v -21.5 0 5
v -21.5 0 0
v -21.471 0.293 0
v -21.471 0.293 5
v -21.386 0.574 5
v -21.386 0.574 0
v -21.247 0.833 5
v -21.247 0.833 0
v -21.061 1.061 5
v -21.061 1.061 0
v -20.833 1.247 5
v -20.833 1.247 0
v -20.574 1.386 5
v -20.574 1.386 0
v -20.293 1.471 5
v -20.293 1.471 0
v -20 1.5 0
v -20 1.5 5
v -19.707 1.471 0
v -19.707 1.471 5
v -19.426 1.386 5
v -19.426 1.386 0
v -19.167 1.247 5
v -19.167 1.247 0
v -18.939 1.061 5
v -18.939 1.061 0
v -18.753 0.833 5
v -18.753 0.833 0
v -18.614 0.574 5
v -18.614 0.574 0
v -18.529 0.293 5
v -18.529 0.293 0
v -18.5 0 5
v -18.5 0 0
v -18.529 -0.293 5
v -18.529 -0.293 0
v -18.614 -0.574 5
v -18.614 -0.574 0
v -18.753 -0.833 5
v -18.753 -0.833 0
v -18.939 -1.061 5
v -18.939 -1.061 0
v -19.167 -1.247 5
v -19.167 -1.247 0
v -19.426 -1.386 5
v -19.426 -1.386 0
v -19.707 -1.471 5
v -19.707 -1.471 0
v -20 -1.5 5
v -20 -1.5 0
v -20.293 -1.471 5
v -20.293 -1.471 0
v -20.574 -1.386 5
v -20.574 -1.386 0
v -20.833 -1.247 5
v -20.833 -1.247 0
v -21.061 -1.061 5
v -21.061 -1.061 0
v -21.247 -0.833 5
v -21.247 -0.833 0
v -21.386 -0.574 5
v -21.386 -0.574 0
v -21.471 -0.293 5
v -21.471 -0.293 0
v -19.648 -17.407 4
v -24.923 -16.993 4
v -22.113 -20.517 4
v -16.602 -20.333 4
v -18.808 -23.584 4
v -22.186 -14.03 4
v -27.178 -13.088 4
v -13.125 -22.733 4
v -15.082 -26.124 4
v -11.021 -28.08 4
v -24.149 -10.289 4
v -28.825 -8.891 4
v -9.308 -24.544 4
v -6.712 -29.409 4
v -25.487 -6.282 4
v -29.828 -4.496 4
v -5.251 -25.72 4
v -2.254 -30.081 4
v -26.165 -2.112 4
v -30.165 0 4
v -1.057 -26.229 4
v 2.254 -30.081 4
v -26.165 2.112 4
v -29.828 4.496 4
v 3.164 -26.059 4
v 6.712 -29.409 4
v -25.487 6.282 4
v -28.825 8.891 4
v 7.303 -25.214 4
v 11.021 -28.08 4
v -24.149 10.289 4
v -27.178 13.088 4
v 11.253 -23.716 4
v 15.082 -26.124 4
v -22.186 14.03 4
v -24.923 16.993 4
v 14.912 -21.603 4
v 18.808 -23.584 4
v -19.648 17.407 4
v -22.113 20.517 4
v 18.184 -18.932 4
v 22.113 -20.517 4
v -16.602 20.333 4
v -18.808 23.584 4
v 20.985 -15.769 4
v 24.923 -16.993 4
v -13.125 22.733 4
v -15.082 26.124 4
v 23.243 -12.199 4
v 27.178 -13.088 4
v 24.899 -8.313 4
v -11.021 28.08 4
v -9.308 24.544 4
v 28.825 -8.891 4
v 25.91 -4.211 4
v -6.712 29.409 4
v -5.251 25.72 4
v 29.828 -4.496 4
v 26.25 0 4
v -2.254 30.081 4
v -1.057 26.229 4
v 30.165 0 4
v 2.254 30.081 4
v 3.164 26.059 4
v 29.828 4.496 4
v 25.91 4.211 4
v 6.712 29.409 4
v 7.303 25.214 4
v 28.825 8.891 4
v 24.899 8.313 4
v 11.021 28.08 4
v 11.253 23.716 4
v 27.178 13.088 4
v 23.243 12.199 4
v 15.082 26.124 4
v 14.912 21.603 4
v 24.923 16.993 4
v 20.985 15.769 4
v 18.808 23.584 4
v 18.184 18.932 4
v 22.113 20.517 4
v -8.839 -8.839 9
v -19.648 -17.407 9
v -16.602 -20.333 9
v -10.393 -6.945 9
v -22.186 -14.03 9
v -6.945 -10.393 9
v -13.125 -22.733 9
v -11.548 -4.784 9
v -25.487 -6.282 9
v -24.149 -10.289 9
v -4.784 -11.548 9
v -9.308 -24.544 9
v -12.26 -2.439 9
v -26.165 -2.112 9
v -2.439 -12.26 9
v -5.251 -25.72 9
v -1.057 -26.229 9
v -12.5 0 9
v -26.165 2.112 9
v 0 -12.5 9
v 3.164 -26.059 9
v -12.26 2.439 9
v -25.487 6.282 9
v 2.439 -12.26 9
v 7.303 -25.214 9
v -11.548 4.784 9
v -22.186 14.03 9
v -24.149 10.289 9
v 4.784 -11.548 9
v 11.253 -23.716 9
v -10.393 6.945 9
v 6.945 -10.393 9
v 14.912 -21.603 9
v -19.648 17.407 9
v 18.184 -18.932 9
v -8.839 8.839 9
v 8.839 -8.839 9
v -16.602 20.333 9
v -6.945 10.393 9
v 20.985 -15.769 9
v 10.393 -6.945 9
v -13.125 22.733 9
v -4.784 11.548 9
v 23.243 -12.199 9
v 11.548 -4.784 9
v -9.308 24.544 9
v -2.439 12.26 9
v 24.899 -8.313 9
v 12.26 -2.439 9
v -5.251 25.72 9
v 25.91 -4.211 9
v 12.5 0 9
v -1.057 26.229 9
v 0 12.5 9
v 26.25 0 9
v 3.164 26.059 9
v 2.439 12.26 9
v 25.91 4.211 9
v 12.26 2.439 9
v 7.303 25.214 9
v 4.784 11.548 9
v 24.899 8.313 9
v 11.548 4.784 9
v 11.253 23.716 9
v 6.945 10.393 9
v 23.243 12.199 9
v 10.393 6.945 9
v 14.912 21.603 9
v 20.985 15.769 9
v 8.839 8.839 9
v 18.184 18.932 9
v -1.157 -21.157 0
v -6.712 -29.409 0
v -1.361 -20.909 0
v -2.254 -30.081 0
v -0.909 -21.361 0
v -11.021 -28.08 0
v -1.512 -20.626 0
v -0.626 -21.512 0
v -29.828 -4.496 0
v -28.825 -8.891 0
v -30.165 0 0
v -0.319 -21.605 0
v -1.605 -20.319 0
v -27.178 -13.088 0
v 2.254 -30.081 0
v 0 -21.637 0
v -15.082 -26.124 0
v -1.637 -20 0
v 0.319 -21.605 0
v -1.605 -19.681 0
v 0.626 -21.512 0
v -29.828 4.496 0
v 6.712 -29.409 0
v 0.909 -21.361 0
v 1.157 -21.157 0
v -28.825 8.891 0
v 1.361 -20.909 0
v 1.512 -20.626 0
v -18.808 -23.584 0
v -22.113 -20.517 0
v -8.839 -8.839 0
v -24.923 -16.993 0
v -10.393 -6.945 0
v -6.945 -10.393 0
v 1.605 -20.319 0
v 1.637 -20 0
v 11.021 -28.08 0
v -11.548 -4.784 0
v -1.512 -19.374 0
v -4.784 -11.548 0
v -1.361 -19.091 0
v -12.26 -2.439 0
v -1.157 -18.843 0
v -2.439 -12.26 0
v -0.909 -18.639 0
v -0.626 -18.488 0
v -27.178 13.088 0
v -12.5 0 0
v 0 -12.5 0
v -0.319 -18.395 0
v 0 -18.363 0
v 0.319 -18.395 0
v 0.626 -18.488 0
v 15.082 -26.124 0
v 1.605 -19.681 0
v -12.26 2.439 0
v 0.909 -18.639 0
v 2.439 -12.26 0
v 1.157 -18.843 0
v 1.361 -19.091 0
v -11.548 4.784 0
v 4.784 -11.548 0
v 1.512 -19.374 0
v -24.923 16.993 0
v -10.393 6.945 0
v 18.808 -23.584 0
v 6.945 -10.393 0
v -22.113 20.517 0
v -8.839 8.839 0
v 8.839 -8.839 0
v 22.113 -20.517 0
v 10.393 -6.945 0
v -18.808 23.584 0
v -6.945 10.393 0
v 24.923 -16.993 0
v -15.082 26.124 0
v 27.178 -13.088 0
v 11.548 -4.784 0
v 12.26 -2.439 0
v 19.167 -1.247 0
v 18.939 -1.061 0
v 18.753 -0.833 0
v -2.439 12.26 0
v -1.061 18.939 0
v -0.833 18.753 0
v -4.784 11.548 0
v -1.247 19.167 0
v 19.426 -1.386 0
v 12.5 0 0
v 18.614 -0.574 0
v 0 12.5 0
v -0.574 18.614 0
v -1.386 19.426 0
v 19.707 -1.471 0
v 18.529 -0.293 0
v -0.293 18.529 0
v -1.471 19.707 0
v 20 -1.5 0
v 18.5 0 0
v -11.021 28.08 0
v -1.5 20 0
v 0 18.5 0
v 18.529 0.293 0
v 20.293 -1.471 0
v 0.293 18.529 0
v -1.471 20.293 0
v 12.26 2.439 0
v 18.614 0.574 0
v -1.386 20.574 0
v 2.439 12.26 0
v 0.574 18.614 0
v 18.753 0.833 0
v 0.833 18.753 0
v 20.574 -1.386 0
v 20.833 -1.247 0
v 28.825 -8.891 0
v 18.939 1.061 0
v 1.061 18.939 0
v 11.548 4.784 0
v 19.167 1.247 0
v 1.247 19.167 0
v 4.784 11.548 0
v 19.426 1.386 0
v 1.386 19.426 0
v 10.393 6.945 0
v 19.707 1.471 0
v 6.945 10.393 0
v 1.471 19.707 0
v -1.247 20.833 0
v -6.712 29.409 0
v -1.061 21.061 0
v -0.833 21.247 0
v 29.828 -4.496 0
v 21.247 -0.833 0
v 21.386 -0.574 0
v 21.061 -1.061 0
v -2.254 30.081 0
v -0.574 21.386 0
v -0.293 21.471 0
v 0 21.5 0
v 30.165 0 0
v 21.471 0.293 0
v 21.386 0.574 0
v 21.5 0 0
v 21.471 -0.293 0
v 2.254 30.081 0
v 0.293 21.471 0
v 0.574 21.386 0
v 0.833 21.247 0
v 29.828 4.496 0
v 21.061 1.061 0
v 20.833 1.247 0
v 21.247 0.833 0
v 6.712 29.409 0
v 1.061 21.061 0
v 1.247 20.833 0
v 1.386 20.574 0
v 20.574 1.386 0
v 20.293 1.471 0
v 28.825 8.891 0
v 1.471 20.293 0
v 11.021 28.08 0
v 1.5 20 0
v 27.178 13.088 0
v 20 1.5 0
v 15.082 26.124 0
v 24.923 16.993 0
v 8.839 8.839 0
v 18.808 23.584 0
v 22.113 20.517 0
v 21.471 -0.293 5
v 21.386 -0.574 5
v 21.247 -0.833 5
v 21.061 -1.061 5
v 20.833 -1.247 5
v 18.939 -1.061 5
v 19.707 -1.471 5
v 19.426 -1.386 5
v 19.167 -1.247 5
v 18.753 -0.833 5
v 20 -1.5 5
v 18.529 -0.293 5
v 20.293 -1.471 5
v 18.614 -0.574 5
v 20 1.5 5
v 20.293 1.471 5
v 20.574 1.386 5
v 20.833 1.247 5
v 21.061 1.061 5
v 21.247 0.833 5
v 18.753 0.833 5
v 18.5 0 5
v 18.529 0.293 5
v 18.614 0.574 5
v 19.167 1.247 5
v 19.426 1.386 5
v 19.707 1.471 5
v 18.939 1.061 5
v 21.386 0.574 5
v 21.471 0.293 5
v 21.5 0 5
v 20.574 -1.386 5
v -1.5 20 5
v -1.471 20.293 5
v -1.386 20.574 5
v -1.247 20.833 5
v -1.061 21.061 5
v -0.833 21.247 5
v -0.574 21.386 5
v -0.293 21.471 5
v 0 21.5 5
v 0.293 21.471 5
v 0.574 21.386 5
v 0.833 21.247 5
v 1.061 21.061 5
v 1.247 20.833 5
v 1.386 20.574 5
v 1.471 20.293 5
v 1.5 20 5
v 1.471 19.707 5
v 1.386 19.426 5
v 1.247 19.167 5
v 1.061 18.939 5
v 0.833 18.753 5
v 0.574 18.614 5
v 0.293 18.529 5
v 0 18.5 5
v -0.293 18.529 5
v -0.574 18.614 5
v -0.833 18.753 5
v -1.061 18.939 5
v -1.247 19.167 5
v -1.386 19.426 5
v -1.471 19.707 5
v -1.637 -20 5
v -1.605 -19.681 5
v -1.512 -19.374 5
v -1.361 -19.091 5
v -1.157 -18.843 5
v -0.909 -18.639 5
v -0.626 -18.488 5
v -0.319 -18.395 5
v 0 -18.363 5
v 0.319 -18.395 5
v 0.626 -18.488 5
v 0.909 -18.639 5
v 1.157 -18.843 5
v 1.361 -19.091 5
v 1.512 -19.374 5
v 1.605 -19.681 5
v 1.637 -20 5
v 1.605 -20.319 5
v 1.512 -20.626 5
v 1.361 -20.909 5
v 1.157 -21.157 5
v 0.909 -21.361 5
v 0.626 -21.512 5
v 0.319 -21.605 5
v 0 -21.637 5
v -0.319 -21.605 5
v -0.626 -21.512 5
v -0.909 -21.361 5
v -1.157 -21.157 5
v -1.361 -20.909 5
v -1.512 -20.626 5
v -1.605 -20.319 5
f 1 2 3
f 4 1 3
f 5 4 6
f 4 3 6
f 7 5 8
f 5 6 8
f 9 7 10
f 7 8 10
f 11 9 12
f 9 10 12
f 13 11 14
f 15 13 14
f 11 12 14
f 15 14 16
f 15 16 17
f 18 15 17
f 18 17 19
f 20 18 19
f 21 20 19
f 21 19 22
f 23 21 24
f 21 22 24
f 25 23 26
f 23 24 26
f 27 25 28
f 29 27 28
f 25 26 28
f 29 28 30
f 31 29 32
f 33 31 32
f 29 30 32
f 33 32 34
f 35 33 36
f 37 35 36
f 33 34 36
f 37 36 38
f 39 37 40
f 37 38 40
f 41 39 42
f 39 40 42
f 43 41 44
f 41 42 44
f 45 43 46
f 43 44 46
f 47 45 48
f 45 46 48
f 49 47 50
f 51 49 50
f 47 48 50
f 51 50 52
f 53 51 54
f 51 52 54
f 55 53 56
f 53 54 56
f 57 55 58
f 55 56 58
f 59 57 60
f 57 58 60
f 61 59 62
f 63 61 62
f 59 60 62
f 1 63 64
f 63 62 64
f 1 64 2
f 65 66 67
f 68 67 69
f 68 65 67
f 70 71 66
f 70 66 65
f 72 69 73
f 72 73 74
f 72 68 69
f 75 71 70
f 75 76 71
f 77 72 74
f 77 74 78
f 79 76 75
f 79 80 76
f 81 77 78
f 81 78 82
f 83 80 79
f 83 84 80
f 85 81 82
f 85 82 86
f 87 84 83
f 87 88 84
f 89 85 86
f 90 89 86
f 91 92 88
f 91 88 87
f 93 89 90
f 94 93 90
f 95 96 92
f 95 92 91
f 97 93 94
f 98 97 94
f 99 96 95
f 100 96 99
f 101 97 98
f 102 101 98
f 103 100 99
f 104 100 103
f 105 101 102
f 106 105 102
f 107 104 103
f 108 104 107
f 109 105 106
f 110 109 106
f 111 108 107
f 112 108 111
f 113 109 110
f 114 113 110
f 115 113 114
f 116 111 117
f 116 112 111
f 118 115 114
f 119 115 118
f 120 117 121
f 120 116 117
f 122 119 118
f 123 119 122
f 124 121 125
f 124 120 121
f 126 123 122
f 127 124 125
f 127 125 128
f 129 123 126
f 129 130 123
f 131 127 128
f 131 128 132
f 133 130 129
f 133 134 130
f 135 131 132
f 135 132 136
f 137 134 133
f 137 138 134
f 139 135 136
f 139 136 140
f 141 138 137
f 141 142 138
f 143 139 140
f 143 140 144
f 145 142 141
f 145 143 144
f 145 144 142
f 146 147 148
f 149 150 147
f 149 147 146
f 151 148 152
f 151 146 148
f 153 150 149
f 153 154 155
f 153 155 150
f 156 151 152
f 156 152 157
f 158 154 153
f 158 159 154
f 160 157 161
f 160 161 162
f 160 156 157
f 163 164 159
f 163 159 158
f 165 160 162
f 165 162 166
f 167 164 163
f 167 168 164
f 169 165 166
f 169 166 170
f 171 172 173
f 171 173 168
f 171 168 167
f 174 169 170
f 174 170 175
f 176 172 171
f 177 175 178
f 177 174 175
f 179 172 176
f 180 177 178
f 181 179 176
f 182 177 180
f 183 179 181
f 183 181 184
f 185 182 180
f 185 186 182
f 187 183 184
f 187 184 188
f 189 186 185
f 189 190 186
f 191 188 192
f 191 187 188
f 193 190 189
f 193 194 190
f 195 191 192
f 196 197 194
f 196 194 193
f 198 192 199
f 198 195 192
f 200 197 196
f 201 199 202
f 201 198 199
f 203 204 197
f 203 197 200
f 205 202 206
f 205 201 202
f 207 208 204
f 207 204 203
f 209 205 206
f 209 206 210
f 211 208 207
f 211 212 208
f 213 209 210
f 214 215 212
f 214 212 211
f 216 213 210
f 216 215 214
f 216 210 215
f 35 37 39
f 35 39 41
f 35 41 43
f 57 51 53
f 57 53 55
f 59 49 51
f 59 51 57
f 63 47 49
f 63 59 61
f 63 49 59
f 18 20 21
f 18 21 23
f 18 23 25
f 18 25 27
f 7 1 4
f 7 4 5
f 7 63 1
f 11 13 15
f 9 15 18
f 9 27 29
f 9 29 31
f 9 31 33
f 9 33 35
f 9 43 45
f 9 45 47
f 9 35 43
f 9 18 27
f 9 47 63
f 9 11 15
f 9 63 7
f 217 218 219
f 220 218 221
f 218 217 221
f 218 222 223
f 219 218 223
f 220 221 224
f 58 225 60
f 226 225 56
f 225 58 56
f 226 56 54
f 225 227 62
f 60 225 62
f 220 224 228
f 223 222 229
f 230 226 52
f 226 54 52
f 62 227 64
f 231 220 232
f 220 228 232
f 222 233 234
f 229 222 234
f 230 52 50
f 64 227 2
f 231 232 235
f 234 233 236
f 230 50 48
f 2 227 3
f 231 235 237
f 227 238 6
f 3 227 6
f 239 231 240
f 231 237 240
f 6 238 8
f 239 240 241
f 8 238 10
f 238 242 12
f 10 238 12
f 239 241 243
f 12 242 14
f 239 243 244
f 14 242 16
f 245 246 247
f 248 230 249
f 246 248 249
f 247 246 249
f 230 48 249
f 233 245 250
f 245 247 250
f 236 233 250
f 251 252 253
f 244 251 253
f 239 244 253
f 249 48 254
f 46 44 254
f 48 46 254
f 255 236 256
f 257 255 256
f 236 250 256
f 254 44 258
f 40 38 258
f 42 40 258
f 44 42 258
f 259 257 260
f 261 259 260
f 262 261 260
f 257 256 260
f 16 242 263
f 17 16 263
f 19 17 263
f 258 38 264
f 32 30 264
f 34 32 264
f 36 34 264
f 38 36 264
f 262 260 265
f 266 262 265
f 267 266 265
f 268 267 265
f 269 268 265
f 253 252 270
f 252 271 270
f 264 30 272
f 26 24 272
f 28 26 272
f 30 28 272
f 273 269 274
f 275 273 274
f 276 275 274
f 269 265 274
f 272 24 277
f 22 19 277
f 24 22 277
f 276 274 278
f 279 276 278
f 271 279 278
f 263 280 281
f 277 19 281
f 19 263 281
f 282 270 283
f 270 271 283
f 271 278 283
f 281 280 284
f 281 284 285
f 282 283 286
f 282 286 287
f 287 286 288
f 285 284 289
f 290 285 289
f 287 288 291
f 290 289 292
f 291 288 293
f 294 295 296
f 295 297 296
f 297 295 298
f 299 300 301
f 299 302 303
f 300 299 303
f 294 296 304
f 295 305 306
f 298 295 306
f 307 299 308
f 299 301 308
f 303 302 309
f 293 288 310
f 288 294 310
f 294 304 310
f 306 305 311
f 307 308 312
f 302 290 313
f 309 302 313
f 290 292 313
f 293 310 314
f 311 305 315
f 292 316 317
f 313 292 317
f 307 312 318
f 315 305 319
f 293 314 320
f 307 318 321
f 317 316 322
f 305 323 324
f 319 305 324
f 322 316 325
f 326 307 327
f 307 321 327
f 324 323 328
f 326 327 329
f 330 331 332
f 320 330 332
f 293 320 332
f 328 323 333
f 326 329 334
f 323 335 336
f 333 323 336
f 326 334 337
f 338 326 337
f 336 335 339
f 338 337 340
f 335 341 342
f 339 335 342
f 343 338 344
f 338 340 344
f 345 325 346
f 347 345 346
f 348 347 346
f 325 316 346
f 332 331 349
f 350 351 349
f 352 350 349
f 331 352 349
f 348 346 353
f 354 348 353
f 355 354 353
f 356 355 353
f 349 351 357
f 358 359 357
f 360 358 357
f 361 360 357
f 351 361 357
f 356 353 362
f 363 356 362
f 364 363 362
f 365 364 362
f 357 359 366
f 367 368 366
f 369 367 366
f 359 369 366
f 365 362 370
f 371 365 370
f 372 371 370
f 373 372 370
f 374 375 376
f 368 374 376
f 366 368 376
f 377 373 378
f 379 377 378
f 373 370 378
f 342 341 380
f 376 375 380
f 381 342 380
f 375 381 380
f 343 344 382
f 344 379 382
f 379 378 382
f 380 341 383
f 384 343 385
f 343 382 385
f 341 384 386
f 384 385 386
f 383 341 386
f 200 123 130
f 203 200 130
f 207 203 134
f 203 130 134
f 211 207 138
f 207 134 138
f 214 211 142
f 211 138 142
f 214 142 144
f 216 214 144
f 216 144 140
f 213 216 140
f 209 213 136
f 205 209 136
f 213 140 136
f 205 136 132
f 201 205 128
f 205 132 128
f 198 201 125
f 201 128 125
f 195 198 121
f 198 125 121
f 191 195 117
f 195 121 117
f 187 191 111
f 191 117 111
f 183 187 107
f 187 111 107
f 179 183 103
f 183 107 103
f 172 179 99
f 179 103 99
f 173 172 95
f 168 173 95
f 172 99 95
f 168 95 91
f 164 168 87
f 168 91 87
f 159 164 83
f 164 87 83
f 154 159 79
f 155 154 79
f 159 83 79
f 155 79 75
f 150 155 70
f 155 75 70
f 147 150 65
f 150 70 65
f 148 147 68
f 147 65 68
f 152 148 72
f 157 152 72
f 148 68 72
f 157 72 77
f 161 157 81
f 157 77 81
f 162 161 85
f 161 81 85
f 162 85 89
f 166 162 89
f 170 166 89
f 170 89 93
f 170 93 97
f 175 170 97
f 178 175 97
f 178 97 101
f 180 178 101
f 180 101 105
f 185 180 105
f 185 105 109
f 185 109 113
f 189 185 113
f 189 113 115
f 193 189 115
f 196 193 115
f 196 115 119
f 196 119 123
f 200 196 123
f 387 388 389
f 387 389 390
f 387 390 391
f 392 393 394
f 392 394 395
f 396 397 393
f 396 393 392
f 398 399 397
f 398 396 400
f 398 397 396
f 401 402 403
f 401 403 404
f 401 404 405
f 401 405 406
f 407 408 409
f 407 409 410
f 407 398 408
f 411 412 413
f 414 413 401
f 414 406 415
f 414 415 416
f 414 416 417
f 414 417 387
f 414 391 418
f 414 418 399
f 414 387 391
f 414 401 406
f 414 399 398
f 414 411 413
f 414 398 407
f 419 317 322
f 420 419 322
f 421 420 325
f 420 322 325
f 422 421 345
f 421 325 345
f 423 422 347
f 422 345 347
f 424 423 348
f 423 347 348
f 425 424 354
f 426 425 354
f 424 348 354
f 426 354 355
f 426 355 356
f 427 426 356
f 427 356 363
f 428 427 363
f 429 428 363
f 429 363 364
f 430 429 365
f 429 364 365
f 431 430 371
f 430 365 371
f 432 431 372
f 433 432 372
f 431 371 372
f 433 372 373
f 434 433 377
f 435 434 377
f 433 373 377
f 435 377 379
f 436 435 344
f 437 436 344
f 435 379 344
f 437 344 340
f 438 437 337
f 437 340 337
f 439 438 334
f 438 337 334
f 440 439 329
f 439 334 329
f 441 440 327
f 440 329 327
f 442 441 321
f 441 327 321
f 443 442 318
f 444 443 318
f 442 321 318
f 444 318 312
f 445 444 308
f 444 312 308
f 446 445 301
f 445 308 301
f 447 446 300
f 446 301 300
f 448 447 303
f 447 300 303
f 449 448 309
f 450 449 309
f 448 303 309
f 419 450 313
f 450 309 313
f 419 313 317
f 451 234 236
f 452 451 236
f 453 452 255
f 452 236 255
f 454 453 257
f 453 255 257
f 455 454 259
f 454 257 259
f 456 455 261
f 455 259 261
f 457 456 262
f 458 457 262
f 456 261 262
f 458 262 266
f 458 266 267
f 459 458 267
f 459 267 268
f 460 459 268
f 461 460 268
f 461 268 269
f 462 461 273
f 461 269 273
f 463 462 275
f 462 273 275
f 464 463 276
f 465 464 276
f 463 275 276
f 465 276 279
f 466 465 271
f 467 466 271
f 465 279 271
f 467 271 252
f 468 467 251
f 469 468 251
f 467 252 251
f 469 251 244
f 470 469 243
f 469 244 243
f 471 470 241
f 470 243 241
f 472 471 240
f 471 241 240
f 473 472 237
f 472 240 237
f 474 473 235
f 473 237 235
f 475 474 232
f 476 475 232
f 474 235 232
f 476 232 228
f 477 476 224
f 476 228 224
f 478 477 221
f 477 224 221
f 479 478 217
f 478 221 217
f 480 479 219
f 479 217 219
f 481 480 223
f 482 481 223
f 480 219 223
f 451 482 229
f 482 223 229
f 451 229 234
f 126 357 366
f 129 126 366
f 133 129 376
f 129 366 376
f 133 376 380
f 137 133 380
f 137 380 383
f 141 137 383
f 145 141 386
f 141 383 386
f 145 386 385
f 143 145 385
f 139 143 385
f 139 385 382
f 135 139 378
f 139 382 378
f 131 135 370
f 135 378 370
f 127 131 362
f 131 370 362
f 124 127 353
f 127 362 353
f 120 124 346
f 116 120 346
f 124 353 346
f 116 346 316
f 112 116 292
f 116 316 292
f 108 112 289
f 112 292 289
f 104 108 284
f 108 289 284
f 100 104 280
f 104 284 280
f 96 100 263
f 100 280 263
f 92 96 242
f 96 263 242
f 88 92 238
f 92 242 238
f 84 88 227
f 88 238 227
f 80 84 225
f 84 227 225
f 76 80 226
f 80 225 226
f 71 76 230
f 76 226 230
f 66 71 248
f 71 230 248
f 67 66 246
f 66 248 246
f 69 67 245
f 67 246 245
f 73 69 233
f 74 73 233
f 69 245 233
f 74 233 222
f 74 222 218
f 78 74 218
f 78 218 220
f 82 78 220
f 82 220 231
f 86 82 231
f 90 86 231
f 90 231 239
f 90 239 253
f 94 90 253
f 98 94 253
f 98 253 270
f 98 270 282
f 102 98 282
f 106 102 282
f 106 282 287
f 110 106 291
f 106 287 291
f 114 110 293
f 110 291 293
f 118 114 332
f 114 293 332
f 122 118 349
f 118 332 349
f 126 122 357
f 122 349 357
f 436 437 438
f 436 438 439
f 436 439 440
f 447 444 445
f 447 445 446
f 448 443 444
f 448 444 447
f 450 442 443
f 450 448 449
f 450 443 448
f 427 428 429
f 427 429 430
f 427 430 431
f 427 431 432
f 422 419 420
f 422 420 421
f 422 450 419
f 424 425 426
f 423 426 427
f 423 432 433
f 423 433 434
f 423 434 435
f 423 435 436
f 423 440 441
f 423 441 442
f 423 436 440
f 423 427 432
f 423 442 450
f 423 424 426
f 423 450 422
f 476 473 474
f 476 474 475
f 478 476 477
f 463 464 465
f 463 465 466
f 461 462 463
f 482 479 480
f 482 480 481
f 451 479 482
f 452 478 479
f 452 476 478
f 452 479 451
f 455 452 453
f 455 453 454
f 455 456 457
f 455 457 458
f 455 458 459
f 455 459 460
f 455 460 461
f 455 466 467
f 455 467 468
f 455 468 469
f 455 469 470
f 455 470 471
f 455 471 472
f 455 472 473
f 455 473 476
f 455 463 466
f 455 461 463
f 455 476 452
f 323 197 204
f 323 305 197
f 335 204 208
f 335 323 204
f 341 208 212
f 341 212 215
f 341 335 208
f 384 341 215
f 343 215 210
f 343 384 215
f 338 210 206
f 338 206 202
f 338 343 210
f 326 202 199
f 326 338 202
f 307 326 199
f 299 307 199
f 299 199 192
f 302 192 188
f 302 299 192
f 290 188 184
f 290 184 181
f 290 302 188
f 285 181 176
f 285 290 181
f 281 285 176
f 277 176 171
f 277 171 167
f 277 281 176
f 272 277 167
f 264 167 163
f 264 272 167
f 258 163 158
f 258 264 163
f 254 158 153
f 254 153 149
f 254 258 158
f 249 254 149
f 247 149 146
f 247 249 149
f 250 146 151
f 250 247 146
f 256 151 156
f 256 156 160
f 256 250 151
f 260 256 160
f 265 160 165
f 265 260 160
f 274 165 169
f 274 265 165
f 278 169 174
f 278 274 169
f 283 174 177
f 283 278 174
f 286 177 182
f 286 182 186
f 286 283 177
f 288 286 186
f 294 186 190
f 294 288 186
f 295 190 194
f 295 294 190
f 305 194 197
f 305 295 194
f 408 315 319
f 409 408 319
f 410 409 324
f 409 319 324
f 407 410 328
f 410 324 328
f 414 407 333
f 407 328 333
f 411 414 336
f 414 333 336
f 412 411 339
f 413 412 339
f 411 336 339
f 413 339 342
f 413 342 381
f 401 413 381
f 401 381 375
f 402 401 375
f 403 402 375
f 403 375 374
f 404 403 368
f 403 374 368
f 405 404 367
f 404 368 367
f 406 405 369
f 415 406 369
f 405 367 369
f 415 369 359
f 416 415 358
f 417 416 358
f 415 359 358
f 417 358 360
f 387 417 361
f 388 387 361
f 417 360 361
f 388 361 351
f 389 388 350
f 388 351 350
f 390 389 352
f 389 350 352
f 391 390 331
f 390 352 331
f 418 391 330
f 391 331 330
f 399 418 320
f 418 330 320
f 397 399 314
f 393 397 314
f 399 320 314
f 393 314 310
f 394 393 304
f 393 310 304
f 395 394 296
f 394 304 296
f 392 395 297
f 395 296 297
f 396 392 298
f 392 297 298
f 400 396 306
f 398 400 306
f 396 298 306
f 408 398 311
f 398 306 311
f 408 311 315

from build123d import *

# Parameters (mm, degrees)
SKETCH2_R             = 30.165
SKETCH2_R_2           = 12.5
BOSS_EXTRUDE1_DEPTH   = 4
SKETCH3_R             = 26.25
SKETCH3_R_2           = 12.5
BOSS_EXTRUDE2_DEPTH   = 5
CROQUIS1_R            = 1.5
CROQUIS1_R_2          = 1.636681132
CORTAR_EXTRUIR1_DEPTH = 5


with BuildPart() as part:
    # Sketch2 → Boss-Extrude1 (new body)
    with BuildSketch(Plane.XY):
        Circle(SKETCH2_R)
        Circle(SKETCH2_R_2, mode=Mode.SUBTRACT)
    extrude(amount=BOSS_EXTRUDE1_DEPTH)

    # Sketch3 → Boss-Extrude2 (add)
    with BuildSketch(Plane.XY.offset(4)):
        Circle(SKETCH3_R)
        Circle(SKETCH3_R_2, mode=Mode.SUBTRACT)
    extrude(amount=BOSS_EXTRUDE2_DEPTH)

    # Croquis1 → Cortar-Extruir1 (cut)
    with BuildSketch(Plane(origin=(0, 0, 0), x_dir=(-1, 0, 0), z_dir=(0, 0, -1))):
        with Locations((0, 20)):
            Circle(CROQUIS1_R)
        with Locations((0, -20)):
            Circle(CROQUIS1_R_2)
        with Locations((20, 0)):
            Circle(CROQUIS1_R)
        with Locations((-20, 0)):
            Circle(CROQUIS1_R)
    extrude(amount=-CORTAR_EXTRUIR1_DEPTH, mode=Mode.SUBTRACT)


solid = part.part
